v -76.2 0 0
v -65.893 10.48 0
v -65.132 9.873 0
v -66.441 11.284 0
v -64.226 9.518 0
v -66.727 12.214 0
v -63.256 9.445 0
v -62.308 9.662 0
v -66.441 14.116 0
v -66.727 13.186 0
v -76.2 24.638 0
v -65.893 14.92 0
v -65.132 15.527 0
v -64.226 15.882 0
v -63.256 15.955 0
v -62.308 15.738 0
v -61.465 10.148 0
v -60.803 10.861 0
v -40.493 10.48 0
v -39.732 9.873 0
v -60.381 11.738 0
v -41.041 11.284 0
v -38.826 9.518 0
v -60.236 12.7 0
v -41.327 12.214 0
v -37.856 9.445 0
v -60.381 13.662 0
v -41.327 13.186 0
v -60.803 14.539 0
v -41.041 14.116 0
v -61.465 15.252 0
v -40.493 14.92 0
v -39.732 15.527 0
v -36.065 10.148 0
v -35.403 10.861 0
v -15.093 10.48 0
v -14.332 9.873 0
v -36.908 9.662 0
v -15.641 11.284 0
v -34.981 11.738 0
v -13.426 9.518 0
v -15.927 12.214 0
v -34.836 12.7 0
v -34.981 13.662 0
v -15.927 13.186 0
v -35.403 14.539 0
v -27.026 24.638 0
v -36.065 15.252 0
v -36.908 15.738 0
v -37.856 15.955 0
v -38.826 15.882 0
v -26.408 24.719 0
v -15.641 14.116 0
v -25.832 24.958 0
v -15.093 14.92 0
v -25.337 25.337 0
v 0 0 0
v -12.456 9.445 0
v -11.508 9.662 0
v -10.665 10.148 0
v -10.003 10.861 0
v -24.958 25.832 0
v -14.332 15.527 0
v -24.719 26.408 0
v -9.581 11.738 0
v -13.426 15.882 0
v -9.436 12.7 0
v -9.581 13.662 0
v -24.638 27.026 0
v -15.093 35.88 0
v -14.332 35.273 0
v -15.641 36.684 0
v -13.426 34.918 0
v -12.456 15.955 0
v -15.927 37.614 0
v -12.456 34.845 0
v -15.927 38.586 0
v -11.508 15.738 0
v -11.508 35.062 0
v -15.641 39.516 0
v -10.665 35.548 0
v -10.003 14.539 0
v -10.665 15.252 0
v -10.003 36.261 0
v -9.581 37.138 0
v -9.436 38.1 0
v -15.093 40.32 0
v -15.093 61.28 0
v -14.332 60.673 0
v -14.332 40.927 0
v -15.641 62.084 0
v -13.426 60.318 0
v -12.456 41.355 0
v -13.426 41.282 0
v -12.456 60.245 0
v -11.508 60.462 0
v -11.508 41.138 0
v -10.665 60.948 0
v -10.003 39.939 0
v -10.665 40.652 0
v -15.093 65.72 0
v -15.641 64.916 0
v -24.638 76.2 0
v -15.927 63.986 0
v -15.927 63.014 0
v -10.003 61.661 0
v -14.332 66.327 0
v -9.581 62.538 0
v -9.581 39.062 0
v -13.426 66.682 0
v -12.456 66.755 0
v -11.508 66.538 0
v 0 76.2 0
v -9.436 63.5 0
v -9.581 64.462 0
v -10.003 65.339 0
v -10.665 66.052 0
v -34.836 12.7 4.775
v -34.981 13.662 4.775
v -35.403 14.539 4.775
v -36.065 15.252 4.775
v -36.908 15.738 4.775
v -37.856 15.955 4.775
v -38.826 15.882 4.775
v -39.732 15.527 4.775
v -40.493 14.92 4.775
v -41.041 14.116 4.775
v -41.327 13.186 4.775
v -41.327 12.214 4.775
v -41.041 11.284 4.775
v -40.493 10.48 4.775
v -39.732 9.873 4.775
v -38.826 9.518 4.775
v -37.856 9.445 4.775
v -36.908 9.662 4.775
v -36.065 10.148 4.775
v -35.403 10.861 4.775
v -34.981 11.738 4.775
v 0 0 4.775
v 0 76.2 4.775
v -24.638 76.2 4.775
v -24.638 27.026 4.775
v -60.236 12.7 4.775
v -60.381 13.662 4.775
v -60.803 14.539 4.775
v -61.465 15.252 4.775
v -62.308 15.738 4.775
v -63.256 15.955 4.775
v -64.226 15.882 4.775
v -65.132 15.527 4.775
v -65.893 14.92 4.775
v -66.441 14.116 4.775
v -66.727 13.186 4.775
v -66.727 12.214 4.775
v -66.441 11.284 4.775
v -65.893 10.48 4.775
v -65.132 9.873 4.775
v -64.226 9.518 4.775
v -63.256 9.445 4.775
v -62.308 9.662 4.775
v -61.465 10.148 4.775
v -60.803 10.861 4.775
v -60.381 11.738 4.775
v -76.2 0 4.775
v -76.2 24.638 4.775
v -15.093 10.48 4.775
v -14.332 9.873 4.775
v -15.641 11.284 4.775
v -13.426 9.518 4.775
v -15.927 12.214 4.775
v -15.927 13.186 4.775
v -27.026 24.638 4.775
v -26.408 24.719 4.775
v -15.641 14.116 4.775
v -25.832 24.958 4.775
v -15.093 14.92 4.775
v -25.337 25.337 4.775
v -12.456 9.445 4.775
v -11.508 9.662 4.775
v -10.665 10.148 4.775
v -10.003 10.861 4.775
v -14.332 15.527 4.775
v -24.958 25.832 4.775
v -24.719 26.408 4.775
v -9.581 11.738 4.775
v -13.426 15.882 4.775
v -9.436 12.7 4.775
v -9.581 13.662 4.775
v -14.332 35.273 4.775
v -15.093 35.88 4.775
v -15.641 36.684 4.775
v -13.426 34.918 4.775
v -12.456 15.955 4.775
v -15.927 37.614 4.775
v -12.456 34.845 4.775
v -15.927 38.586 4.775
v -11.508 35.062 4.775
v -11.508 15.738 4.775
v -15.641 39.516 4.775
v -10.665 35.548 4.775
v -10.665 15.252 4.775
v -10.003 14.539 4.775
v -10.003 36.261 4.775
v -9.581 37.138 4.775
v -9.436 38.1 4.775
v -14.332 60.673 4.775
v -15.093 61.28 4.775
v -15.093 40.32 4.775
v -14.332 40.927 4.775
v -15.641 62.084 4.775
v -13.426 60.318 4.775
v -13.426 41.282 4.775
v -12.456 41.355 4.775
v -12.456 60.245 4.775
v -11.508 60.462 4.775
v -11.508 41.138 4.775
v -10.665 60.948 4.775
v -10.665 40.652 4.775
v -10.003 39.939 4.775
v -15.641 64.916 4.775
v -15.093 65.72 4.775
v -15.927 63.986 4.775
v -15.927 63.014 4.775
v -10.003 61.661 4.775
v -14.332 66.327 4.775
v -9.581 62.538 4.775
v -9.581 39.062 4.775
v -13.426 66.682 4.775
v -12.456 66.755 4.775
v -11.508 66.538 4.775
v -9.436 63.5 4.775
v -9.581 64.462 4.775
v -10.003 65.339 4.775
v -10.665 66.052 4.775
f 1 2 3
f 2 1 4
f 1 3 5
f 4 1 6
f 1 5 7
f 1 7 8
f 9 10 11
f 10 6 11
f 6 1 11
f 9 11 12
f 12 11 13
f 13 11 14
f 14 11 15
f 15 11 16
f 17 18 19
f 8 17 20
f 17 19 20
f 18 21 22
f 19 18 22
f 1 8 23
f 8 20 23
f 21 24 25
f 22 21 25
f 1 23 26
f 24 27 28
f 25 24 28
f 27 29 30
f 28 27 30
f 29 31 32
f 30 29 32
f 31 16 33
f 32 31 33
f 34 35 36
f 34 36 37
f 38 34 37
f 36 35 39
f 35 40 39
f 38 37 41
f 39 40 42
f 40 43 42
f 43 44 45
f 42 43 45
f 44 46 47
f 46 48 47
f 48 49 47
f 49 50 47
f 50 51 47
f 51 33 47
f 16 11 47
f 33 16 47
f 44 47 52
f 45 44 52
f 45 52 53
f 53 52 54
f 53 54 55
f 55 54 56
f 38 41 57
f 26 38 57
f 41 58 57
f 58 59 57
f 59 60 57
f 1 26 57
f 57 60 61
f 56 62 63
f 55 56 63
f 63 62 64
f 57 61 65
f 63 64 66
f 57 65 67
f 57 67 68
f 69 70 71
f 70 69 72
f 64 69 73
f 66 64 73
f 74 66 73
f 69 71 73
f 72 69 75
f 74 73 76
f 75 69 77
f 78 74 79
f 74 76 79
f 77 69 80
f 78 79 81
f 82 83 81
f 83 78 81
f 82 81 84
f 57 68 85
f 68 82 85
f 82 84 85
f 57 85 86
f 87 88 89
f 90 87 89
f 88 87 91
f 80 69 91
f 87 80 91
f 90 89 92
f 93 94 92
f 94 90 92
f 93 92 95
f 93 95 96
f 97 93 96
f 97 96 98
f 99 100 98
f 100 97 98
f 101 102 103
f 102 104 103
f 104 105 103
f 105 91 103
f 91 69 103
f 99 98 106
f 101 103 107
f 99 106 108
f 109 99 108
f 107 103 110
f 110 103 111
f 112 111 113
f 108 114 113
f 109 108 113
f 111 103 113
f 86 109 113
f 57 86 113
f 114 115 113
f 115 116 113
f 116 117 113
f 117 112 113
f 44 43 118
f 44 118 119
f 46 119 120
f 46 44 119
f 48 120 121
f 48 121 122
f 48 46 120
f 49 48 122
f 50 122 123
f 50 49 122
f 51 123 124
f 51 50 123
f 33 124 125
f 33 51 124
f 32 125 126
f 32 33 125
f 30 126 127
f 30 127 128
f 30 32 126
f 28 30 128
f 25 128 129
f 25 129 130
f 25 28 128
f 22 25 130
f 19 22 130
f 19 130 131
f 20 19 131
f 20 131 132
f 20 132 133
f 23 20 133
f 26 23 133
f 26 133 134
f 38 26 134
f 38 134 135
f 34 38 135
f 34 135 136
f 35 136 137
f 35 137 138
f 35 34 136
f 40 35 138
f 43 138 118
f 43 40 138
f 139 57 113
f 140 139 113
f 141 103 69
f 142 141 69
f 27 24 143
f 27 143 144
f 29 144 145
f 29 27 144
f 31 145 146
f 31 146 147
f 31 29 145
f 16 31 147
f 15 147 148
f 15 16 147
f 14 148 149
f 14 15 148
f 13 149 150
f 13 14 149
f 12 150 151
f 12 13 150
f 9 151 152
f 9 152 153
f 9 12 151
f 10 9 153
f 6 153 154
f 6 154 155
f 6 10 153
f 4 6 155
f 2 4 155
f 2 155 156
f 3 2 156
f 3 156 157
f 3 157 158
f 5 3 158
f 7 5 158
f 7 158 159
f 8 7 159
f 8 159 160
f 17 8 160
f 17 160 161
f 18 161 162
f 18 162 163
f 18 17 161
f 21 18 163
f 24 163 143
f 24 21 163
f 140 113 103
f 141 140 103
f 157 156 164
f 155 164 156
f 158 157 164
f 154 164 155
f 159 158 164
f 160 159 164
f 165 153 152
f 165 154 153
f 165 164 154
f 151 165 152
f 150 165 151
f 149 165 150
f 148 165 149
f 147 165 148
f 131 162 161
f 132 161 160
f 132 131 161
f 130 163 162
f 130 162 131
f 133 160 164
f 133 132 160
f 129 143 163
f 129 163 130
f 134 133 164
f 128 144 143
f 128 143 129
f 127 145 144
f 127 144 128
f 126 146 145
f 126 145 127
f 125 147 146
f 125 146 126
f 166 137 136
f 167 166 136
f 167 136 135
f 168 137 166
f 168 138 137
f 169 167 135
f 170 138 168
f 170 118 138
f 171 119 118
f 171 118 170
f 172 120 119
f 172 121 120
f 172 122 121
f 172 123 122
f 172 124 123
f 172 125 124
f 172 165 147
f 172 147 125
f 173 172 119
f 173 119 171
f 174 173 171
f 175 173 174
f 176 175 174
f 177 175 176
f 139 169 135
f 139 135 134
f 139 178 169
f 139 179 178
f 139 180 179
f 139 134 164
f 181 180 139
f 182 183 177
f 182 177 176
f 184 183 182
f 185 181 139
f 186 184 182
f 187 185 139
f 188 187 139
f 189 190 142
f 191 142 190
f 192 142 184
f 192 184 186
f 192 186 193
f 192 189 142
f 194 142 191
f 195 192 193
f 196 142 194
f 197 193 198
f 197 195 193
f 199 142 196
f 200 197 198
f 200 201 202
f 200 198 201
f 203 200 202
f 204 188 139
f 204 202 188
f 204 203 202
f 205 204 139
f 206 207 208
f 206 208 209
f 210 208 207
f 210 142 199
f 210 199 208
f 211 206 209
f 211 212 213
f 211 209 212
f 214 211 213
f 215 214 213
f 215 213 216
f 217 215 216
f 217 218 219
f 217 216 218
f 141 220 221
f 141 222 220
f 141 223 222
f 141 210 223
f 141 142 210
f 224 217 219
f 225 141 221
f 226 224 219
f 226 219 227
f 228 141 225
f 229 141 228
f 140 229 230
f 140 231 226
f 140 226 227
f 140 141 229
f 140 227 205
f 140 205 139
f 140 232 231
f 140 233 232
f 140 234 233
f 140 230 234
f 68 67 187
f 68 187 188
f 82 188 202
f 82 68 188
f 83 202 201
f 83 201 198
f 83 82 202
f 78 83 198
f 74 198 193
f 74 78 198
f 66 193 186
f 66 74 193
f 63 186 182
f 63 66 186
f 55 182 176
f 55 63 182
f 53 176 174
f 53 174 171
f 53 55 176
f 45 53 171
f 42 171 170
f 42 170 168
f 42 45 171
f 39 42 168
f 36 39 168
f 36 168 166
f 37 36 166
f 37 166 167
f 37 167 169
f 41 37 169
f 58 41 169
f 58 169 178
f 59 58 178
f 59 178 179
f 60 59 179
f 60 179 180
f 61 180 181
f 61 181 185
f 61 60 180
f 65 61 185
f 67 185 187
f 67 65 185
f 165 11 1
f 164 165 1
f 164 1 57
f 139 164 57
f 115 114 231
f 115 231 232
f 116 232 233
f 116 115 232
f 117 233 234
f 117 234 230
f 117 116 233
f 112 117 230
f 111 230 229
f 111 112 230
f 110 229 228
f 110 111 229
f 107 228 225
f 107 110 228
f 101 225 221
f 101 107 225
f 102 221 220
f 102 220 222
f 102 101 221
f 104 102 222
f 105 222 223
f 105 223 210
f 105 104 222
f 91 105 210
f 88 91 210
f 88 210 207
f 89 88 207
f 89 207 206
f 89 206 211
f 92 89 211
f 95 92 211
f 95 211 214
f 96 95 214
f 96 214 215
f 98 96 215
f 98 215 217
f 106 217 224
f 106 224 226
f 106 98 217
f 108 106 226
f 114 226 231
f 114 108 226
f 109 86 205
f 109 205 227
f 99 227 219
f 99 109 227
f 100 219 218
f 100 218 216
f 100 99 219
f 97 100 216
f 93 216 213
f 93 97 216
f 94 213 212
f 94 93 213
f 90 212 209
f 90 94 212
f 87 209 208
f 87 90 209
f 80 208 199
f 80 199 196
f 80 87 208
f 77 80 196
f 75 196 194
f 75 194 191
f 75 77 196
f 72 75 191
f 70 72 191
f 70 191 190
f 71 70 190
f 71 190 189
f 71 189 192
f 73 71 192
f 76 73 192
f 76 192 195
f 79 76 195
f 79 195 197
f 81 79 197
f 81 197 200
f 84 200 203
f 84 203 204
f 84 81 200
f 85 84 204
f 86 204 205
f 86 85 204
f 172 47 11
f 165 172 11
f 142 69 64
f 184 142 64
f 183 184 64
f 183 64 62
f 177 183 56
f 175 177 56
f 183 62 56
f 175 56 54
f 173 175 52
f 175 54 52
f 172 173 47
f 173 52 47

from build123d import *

# Parameters (mm, degrees)
SKETCH1_R           = 3.2639
BOSS_EXTRUDE1_DEPTH = 4.7752


with BuildPart() as part:
    # Sketch1 → Boss-Extrude1 (new body)
    with BuildSketch(Plane.XY):
        with BuildLine():
            Line((-76.2, 0), (0, 0))
            Line((0, 0), (0, 76.2))
            Line((0, 76.2), (-24.638, 76.2))
            Line((-24.638, 76.2), (-24.638, 27.0256))
            ThreePointArc((-24.638, 27.0256), (-25.337311849, 25.337311849), (-27.0256, 24.638))
            Line((-27.0256, 24.638), (-76.2, 24.638))
            Line((-76.2, 24.638), (-76.2, 0))
        make_face()
        with Locations((-12.7, 38.1)):
            Circle(SKETCH1_R, mode=Mode.SUBTRACT)
        with Locations((-12.7, 63.5)):
            Circle(SKETCH1_R, mode=Mode.SUBTRACT)
        with Locations((-12.7, 12.7)):
            Circle(SKETCH1_R, mode=Mode.SUBTRACT)
        with Locations((-38.1, 12.7)):
            Circle(SKETCH1_R, mode=Mode.SUBTRACT)
        with Locations((-63.5, 12.7)):
            Circle(SKETCH1_R, mode=Mode.SUBTRACT)
    extrude(amount=BOSS_EXTRUDE1_DEPTH)


solid = part.part
